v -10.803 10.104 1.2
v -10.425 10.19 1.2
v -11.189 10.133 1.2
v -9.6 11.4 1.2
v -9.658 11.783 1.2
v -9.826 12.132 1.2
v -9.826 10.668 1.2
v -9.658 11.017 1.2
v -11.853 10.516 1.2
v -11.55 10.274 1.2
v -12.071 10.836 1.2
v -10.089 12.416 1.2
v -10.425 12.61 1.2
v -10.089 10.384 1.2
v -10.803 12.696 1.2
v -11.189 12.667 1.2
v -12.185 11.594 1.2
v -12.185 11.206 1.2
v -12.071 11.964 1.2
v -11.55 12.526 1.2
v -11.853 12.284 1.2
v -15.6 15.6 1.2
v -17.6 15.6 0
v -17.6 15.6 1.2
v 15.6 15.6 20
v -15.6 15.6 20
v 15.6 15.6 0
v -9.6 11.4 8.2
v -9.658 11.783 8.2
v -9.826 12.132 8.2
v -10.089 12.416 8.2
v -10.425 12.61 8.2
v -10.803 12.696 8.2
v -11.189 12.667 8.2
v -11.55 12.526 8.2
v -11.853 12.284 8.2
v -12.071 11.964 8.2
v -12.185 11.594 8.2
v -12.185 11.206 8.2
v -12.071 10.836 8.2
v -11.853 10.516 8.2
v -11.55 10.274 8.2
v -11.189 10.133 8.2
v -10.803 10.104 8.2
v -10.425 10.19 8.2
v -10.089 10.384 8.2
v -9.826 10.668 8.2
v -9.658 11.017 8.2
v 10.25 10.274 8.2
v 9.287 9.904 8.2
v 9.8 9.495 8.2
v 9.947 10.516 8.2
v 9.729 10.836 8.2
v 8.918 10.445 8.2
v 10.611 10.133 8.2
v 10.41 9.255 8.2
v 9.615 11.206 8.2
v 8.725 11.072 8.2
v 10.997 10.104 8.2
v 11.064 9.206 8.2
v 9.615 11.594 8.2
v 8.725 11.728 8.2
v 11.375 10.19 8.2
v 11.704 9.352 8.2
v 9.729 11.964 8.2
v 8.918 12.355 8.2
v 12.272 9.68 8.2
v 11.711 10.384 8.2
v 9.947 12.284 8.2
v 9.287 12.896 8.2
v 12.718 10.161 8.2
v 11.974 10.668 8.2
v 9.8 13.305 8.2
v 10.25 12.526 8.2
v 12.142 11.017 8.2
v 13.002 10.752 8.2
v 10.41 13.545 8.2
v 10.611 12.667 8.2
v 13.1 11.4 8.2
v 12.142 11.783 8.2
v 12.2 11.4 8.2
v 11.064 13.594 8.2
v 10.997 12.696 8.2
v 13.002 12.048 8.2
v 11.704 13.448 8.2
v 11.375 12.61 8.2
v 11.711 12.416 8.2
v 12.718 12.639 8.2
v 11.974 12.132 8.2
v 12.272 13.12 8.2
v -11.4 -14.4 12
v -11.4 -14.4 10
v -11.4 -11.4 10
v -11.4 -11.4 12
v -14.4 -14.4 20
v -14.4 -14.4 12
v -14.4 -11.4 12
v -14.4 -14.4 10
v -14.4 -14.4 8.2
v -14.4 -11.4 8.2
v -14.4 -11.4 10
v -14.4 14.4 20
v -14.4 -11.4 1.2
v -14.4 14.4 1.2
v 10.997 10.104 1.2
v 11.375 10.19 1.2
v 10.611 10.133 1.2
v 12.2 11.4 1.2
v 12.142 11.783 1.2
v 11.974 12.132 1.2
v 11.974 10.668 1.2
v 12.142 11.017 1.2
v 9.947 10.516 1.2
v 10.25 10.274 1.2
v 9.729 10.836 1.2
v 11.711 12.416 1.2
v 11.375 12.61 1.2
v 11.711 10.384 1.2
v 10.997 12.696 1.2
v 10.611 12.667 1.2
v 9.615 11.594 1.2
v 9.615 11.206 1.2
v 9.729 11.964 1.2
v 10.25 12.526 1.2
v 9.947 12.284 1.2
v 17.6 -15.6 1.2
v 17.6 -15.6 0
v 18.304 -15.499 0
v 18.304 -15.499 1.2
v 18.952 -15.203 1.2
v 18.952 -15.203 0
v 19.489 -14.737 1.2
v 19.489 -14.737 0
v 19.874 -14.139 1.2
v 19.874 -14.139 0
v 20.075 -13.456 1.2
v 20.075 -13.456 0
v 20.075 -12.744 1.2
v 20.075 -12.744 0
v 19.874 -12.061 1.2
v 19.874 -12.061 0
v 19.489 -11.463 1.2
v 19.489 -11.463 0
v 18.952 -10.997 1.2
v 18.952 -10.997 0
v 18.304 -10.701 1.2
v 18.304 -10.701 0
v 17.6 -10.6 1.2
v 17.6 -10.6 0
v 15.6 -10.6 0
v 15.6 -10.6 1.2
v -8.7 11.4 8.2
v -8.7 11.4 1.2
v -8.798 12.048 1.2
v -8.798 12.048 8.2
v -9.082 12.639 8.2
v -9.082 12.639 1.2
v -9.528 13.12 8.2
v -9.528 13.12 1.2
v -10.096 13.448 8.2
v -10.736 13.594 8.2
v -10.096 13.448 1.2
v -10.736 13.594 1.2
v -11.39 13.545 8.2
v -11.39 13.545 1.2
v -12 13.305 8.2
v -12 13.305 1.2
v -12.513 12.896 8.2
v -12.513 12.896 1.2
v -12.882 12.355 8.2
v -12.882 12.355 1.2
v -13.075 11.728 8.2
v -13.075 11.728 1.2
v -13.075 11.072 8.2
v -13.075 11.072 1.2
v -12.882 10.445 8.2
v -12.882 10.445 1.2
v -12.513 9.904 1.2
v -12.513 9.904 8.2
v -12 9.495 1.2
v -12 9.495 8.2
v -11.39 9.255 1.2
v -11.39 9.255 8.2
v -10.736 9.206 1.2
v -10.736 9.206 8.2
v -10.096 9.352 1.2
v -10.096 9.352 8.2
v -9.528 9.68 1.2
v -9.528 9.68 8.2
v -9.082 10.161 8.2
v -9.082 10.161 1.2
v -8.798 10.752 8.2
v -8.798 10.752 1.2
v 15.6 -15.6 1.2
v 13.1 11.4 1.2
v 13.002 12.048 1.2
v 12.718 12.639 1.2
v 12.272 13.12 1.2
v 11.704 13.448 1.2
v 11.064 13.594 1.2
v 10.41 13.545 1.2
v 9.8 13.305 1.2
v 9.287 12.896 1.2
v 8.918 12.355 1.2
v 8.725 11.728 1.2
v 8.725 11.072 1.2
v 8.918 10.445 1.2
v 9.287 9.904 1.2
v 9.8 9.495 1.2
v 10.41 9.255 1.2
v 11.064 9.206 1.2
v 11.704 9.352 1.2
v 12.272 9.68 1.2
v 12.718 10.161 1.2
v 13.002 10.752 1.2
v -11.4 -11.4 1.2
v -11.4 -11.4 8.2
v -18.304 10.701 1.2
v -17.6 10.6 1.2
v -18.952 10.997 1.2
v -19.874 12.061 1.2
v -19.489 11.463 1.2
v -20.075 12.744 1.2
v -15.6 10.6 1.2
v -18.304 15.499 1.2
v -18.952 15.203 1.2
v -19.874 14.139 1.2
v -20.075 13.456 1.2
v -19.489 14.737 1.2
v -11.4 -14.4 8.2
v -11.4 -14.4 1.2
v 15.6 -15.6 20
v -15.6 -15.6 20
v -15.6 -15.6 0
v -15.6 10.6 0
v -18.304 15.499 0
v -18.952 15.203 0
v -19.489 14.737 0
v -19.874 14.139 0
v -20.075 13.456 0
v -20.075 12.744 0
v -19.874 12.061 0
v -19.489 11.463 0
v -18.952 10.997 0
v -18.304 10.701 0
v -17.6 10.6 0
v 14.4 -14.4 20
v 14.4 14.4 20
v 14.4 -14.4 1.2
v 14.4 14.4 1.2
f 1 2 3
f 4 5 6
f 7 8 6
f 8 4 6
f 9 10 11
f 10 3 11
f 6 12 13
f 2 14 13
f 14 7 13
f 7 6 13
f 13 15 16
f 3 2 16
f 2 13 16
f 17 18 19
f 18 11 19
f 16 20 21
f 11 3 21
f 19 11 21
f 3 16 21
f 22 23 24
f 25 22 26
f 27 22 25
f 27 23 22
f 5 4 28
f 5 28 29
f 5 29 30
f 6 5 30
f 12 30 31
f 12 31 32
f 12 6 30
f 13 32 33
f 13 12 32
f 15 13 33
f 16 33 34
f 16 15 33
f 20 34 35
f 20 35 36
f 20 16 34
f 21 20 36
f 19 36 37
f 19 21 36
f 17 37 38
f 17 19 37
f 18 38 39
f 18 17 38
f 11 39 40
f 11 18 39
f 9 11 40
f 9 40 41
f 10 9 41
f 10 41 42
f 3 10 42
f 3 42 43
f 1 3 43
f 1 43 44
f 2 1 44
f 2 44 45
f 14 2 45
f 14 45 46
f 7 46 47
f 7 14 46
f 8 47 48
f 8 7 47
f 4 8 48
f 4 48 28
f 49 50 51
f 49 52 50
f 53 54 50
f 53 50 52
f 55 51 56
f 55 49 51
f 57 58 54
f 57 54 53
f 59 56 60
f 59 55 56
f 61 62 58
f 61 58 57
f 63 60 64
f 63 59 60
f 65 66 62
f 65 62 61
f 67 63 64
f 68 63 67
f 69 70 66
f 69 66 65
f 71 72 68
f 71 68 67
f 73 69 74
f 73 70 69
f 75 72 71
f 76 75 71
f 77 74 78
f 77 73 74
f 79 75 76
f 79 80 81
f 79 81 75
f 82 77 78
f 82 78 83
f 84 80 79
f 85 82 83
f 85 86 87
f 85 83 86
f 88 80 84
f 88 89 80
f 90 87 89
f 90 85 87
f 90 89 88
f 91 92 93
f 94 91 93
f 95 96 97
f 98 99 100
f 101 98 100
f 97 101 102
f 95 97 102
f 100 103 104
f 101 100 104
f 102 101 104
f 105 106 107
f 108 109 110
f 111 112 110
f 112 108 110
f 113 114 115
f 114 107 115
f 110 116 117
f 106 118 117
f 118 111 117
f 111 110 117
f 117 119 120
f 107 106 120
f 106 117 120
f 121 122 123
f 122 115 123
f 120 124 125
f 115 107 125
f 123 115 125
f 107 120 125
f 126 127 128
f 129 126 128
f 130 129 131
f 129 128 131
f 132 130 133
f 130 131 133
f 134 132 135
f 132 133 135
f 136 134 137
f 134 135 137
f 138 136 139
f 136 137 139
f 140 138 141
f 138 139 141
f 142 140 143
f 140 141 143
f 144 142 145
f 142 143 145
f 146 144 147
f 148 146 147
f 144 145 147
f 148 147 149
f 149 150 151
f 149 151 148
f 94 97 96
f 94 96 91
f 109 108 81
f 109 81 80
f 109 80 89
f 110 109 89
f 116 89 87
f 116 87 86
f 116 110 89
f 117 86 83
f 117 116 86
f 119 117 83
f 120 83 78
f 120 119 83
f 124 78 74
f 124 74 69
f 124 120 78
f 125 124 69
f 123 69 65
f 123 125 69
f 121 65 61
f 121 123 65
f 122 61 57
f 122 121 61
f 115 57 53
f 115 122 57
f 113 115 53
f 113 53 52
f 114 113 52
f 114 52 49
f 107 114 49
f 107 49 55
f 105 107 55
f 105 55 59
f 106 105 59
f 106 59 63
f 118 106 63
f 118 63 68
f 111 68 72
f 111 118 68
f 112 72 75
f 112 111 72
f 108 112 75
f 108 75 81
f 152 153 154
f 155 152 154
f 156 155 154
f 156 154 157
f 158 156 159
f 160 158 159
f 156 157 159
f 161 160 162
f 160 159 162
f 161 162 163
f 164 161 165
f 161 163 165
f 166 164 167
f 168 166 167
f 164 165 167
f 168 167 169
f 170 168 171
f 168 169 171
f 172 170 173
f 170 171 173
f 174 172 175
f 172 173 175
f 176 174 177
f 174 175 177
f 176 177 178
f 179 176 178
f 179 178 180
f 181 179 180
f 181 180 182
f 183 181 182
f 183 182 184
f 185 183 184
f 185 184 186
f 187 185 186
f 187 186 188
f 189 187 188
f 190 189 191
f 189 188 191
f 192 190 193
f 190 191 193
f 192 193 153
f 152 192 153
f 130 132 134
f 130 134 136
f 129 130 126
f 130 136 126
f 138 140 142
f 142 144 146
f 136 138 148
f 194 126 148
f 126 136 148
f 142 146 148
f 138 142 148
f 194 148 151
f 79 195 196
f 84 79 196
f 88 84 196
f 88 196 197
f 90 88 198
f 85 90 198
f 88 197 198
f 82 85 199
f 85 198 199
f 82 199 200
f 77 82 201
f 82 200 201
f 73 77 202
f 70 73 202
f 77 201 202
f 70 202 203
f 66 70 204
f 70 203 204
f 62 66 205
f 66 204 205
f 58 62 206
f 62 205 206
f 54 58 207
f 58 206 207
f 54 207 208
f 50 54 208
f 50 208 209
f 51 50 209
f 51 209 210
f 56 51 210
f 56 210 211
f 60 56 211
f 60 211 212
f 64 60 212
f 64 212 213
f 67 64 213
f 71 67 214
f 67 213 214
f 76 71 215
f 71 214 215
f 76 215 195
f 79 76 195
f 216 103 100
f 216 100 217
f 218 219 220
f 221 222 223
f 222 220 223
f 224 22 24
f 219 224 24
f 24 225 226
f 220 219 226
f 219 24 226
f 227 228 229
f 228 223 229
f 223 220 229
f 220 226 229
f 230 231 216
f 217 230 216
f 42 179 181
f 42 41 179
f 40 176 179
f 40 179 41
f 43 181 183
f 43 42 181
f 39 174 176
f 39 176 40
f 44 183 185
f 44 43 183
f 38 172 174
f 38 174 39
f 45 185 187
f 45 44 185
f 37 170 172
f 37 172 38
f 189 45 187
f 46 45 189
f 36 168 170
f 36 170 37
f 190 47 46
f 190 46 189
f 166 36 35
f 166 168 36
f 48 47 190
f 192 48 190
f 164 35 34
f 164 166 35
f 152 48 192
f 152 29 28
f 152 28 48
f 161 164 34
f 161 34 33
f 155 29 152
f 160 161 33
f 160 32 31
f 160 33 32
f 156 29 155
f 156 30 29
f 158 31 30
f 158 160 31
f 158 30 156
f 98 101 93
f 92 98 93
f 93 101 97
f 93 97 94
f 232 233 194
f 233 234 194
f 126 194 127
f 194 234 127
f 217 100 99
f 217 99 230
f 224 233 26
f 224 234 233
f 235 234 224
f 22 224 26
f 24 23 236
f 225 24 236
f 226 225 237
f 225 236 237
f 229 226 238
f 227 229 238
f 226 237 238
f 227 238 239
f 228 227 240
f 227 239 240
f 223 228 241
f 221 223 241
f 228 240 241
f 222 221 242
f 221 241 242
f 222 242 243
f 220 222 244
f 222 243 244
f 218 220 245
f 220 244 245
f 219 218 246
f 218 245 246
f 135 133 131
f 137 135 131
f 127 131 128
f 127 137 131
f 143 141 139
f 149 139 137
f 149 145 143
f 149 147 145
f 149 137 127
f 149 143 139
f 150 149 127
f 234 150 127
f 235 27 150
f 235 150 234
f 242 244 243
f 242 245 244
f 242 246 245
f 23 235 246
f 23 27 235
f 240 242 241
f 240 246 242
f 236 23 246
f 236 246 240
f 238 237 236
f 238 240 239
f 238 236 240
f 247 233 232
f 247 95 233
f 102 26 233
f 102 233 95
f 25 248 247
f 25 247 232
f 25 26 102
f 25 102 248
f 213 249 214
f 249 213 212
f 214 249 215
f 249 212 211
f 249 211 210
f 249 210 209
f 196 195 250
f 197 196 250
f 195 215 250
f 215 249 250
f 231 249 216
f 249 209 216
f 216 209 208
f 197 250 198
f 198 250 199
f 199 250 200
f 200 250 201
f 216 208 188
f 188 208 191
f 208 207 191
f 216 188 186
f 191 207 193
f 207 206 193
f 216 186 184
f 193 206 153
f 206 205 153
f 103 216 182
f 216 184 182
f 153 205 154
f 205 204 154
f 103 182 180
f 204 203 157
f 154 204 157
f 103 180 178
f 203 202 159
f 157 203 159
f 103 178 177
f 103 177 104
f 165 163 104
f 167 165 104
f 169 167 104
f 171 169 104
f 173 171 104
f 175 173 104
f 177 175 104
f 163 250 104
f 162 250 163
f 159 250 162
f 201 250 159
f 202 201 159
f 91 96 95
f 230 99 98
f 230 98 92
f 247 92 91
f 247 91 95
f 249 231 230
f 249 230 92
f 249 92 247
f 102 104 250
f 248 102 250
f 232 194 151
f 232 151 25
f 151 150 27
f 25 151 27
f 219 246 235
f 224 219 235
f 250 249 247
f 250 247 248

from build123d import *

# Parameters (mm, degrees)
SKETCH002_R   = 2.2
SKETCH002_R_2 = 1.3
SKETCH002_W   = 3
SKETCH002_H   = 3
PAD_DEPTH     = 7
SKETCH_W      = 31.2
SKETCH_H      = 31.2
SKETCH_W_2    = 28.8
SKETCH_H_2    = 28.8
PAD002_DEPTH  = 18.8
SKETCH003_W   = 3
SKETCH003_H   = 3
PAD003_DEPTH  = 2
PAD001_DEPTH  = 1.2


with BuildPart() as pad:
    # Sketch002 → Pad (new body)
    with BuildSketch(Plane.XY.offset(1.2)):
        with Locations((-10.9, 11.4)):
            Circle(SKETCH002_R)
        with Locations((-10.9, 11.4)):
            Circle(SKETCH002_R_2, mode=Mode.SUBTRACT)
        with Locations((10.9, 11.4)):
            Circle(SKETCH002_R)
        with Locations((10.9, 11.4)):
            Circle(SKETCH002_R_2, mode=Mode.SUBTRACT)
        with Locations((-12.9, -12.9)):
            Rectangle(SKETCH002_W, SKETCH002_H)
    extrude(amount=PAD_DEPTH)


with BuildPart() as pad002:
    # Sketch → Pad002 (new body)
    with BuildSketch(Plane.XY.offset(1.2)):
        Rectangle(SKETCH_W, SKETCH_H)
        Rectangle(SKETCH_W_2, SKETCH_H_2, mode=Mode.SUBTRACT)
    extrude(amount=PAD002_DEPTH)


with BuildPart() as pad003:
    # Sketch003 → Pad003 (new body)
    with BuildSketch(Plane.XY.offset(10)):
        with Locations((-12.9, -12.9)):
            Rectangle(SKETCH003_W, SKETCH003_H)
    extrude(amount=PAD003_DEPTH)


with BuildPart() as fusion:
    # Sketch001 → Pad001 (new body)
    with BuildSketch(Plane.XY):
        with BuildLine():
            Line((-15.6, 15.6), (15.6, 15.6))
            Line((15.6, 15.6), (15.6, -10.6))
            Line((15.6, -10.6), (17.6, -10.60001))
            ThreePointArc((17.6, -15.6), (20.099979, -13.100005), (17.6, -10.60001))
            Line((15.6, -15.6), (17.6, -15.6))
            Line((15.6, -15.6), (-15.6, -15.6))
            Line((-15.6, -15.6), (-15.6, 10.6))
            Line((-17.6, 10.6), (-15.6, 10.6))
            ThreePointArc((-17.6, 15.6), (-20.099999, 13.1), (-17.6, 10.6))
            Line((-17.6, 15.6), (-15.6, 15.6))
        make_face()
    extrude(amount=PAD001_DEPTH)

    # Fusion: union Pad, Pad002, Pad003
    add(pad.part)
    add(pad002.part)
    add(pad003.part)


solid = fusion.part
